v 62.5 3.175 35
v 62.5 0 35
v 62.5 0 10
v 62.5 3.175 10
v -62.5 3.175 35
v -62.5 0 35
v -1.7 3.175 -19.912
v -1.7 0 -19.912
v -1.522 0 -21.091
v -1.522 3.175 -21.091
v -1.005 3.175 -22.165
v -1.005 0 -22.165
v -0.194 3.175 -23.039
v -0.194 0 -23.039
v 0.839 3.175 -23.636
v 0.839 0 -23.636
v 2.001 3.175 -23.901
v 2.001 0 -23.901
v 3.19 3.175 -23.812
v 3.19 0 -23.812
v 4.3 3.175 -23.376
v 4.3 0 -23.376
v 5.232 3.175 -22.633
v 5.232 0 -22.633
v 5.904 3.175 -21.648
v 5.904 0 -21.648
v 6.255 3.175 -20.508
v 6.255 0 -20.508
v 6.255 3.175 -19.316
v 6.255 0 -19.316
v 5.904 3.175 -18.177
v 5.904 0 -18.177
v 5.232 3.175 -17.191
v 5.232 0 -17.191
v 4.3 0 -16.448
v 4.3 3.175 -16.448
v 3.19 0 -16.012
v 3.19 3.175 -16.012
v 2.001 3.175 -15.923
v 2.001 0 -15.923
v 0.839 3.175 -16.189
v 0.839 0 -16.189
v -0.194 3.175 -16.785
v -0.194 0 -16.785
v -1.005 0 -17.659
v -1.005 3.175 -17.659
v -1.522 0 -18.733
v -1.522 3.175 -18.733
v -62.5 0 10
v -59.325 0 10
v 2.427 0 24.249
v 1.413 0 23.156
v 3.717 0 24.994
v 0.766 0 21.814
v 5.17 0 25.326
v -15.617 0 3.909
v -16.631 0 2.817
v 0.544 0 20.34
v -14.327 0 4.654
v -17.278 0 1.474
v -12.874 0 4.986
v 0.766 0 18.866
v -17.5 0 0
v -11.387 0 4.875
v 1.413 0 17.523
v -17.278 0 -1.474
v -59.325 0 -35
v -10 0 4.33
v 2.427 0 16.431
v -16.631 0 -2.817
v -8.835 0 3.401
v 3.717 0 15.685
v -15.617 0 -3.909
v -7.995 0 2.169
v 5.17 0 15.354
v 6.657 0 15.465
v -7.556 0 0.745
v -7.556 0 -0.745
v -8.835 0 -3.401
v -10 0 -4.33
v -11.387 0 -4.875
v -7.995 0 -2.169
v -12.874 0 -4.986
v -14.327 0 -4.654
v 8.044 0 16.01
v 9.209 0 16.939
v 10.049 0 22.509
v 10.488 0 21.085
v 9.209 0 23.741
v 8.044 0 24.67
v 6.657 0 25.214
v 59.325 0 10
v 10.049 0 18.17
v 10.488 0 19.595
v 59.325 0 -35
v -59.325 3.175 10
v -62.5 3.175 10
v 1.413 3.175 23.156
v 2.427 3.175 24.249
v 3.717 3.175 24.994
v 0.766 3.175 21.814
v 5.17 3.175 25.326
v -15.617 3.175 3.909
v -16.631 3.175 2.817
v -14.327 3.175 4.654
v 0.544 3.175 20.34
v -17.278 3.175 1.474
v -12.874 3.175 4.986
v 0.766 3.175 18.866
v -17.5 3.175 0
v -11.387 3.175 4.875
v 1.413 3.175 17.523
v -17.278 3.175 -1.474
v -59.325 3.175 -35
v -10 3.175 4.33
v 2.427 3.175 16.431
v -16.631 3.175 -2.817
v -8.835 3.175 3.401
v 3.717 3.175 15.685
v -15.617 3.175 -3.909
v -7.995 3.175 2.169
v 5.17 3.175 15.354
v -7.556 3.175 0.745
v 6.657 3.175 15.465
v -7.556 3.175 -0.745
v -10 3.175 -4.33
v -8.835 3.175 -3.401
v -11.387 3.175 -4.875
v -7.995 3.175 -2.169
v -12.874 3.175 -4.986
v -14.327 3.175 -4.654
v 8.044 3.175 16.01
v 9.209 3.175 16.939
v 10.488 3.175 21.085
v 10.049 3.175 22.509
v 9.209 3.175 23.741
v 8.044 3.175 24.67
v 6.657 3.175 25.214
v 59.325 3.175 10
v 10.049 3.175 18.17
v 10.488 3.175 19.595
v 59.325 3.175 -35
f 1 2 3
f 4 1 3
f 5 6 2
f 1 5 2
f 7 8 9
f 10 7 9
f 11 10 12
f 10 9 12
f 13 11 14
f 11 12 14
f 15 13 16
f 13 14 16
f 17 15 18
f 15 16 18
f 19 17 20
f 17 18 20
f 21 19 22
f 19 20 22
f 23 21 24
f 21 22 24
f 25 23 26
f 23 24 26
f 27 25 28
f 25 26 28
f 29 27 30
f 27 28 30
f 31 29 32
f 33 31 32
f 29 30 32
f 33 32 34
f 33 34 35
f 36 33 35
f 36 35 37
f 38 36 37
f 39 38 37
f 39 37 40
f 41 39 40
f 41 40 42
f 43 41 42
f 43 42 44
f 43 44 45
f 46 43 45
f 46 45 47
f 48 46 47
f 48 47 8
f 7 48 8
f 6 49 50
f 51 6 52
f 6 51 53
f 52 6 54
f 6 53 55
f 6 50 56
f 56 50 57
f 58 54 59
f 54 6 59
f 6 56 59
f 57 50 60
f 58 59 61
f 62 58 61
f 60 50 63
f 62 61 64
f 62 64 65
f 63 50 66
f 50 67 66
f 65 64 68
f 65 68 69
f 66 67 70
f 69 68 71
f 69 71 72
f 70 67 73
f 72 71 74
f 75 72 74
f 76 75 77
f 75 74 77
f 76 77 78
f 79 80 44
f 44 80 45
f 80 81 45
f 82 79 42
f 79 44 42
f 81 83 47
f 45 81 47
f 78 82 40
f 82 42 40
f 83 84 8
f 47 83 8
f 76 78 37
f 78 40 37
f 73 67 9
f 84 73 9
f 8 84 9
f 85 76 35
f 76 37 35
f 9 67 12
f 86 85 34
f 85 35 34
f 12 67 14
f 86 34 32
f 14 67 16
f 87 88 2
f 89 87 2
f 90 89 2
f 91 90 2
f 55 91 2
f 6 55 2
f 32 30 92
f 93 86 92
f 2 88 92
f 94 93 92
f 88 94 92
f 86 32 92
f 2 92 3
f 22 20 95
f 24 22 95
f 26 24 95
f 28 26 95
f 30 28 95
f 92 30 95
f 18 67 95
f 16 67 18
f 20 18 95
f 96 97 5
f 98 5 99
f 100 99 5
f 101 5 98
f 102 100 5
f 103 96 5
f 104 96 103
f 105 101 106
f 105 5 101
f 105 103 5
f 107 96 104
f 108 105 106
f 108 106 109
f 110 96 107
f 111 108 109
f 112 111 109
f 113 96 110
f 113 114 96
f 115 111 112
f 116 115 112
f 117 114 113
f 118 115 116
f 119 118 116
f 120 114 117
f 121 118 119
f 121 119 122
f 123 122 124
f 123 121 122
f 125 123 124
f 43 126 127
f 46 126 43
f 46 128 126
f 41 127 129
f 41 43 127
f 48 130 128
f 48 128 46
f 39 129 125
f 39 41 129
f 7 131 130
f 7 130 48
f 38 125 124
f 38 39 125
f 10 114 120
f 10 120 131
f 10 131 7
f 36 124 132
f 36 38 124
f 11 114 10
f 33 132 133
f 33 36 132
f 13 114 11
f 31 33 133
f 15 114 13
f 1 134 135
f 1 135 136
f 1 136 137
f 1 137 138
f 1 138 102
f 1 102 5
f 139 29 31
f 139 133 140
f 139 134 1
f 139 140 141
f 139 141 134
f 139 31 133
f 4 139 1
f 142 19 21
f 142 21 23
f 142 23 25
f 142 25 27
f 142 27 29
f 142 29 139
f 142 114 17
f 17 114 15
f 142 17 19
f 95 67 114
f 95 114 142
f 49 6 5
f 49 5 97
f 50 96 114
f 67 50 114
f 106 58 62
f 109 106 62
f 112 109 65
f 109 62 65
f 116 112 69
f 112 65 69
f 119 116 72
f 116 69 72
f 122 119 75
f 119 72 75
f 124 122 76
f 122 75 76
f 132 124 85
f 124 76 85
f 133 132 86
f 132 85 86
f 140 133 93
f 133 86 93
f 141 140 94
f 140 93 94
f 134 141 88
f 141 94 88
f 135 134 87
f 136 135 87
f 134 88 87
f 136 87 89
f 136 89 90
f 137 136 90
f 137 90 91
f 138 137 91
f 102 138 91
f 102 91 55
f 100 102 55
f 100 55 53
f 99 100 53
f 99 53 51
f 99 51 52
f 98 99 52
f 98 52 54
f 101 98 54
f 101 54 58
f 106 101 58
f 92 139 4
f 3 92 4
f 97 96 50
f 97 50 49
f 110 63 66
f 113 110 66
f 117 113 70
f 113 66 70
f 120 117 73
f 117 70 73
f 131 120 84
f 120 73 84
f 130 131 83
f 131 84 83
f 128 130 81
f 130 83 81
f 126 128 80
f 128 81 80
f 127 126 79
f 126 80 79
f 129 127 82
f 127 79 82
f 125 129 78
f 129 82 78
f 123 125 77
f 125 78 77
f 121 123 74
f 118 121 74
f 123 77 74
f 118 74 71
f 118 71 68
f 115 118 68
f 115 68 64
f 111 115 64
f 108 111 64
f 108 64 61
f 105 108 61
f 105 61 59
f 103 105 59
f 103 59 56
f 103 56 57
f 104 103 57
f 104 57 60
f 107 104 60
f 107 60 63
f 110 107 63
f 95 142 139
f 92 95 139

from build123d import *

# Parameters (mm, degrees)
SKETCH1_W                      = 125
SKETCH1_H                      = 70
BOSS_EXTRUDE1_DEPTH            = 3.175
F_10_0_10_DIAMETER_HOLE1_D     = 10
F_10_0_10_DIAMETER_HOLE1_DEPTH = 3.175
F_8_0_8_DIAMETER_HOLE1_D       = 8
F_8_0_8_DIAMETER_HOLE1_DEPTH   = 3.175
CUT_EXTRUDE1_DEPTH             = 4.175


with BuildPart() as part:
    # Sketch1 → Boss-Extrude1 (new body)
    with BuildSketch(Plane(origin=(0, 0, 0), x_dir=(1, 0, 0), z_dir=(0, 1, 0))):
        Rectangle(SKETCH1_W, SKETCH1_H)
    extrude(amount=BOSS_EXTRUDE1_DEPTH)

    # Ø10.0 (10) Diameter Hole1
    with Locations(Plane(origin=(0, 3.175, 0), x_dir=(1, 0, 0), z_dir=(0, 1, 0))):
        with Locations((-12.5, 0), (5.544081657, -20.339852315)):
            Hole(F_10_0_10_DIAMETER_HOLE1_D / 2, depth=F_10_0_10_DIAMETER_HOLE1_DEPTH)

    # Ø8.0 (8) Diameter Hole1
    with Locations(Plane(origin=(0, 3.175, 0), x_dir=(1, 0, 0), z_dir=(0, 1, 0))):
        with Locations((2.300160709, 19.912165142), (-12.5, 0)):
            Hole(F_8_0_8_DIAMETER_HOLE1_D / 2, depth=F_8_0_8_DIAMETER_HOLE1_DEPTH)

    # Sketch7 → Cut-Extrude1 (cut, through all)
    with BuildSketch(Plane(origin=(0, 3.175, 0), x_dir=(1, 0, 0), z_dir=(0, 1, 0))):
        Polygon((-62.5, 35), (-59.325, 35), (-59.325, 10), (-59.325, -10), (-62.5, -10), (-62.5, 10), align=None)
        Polygon((62.5, 35), (59.325, 35), (59.325, 10), (59.325, -10), (62.5, -10), (62.5, 10), align=None)
    extrude(amount=-CUT_EXTRUDE1_DEPTH, mode=Mode.SUBTRACT)


solid = part.part
